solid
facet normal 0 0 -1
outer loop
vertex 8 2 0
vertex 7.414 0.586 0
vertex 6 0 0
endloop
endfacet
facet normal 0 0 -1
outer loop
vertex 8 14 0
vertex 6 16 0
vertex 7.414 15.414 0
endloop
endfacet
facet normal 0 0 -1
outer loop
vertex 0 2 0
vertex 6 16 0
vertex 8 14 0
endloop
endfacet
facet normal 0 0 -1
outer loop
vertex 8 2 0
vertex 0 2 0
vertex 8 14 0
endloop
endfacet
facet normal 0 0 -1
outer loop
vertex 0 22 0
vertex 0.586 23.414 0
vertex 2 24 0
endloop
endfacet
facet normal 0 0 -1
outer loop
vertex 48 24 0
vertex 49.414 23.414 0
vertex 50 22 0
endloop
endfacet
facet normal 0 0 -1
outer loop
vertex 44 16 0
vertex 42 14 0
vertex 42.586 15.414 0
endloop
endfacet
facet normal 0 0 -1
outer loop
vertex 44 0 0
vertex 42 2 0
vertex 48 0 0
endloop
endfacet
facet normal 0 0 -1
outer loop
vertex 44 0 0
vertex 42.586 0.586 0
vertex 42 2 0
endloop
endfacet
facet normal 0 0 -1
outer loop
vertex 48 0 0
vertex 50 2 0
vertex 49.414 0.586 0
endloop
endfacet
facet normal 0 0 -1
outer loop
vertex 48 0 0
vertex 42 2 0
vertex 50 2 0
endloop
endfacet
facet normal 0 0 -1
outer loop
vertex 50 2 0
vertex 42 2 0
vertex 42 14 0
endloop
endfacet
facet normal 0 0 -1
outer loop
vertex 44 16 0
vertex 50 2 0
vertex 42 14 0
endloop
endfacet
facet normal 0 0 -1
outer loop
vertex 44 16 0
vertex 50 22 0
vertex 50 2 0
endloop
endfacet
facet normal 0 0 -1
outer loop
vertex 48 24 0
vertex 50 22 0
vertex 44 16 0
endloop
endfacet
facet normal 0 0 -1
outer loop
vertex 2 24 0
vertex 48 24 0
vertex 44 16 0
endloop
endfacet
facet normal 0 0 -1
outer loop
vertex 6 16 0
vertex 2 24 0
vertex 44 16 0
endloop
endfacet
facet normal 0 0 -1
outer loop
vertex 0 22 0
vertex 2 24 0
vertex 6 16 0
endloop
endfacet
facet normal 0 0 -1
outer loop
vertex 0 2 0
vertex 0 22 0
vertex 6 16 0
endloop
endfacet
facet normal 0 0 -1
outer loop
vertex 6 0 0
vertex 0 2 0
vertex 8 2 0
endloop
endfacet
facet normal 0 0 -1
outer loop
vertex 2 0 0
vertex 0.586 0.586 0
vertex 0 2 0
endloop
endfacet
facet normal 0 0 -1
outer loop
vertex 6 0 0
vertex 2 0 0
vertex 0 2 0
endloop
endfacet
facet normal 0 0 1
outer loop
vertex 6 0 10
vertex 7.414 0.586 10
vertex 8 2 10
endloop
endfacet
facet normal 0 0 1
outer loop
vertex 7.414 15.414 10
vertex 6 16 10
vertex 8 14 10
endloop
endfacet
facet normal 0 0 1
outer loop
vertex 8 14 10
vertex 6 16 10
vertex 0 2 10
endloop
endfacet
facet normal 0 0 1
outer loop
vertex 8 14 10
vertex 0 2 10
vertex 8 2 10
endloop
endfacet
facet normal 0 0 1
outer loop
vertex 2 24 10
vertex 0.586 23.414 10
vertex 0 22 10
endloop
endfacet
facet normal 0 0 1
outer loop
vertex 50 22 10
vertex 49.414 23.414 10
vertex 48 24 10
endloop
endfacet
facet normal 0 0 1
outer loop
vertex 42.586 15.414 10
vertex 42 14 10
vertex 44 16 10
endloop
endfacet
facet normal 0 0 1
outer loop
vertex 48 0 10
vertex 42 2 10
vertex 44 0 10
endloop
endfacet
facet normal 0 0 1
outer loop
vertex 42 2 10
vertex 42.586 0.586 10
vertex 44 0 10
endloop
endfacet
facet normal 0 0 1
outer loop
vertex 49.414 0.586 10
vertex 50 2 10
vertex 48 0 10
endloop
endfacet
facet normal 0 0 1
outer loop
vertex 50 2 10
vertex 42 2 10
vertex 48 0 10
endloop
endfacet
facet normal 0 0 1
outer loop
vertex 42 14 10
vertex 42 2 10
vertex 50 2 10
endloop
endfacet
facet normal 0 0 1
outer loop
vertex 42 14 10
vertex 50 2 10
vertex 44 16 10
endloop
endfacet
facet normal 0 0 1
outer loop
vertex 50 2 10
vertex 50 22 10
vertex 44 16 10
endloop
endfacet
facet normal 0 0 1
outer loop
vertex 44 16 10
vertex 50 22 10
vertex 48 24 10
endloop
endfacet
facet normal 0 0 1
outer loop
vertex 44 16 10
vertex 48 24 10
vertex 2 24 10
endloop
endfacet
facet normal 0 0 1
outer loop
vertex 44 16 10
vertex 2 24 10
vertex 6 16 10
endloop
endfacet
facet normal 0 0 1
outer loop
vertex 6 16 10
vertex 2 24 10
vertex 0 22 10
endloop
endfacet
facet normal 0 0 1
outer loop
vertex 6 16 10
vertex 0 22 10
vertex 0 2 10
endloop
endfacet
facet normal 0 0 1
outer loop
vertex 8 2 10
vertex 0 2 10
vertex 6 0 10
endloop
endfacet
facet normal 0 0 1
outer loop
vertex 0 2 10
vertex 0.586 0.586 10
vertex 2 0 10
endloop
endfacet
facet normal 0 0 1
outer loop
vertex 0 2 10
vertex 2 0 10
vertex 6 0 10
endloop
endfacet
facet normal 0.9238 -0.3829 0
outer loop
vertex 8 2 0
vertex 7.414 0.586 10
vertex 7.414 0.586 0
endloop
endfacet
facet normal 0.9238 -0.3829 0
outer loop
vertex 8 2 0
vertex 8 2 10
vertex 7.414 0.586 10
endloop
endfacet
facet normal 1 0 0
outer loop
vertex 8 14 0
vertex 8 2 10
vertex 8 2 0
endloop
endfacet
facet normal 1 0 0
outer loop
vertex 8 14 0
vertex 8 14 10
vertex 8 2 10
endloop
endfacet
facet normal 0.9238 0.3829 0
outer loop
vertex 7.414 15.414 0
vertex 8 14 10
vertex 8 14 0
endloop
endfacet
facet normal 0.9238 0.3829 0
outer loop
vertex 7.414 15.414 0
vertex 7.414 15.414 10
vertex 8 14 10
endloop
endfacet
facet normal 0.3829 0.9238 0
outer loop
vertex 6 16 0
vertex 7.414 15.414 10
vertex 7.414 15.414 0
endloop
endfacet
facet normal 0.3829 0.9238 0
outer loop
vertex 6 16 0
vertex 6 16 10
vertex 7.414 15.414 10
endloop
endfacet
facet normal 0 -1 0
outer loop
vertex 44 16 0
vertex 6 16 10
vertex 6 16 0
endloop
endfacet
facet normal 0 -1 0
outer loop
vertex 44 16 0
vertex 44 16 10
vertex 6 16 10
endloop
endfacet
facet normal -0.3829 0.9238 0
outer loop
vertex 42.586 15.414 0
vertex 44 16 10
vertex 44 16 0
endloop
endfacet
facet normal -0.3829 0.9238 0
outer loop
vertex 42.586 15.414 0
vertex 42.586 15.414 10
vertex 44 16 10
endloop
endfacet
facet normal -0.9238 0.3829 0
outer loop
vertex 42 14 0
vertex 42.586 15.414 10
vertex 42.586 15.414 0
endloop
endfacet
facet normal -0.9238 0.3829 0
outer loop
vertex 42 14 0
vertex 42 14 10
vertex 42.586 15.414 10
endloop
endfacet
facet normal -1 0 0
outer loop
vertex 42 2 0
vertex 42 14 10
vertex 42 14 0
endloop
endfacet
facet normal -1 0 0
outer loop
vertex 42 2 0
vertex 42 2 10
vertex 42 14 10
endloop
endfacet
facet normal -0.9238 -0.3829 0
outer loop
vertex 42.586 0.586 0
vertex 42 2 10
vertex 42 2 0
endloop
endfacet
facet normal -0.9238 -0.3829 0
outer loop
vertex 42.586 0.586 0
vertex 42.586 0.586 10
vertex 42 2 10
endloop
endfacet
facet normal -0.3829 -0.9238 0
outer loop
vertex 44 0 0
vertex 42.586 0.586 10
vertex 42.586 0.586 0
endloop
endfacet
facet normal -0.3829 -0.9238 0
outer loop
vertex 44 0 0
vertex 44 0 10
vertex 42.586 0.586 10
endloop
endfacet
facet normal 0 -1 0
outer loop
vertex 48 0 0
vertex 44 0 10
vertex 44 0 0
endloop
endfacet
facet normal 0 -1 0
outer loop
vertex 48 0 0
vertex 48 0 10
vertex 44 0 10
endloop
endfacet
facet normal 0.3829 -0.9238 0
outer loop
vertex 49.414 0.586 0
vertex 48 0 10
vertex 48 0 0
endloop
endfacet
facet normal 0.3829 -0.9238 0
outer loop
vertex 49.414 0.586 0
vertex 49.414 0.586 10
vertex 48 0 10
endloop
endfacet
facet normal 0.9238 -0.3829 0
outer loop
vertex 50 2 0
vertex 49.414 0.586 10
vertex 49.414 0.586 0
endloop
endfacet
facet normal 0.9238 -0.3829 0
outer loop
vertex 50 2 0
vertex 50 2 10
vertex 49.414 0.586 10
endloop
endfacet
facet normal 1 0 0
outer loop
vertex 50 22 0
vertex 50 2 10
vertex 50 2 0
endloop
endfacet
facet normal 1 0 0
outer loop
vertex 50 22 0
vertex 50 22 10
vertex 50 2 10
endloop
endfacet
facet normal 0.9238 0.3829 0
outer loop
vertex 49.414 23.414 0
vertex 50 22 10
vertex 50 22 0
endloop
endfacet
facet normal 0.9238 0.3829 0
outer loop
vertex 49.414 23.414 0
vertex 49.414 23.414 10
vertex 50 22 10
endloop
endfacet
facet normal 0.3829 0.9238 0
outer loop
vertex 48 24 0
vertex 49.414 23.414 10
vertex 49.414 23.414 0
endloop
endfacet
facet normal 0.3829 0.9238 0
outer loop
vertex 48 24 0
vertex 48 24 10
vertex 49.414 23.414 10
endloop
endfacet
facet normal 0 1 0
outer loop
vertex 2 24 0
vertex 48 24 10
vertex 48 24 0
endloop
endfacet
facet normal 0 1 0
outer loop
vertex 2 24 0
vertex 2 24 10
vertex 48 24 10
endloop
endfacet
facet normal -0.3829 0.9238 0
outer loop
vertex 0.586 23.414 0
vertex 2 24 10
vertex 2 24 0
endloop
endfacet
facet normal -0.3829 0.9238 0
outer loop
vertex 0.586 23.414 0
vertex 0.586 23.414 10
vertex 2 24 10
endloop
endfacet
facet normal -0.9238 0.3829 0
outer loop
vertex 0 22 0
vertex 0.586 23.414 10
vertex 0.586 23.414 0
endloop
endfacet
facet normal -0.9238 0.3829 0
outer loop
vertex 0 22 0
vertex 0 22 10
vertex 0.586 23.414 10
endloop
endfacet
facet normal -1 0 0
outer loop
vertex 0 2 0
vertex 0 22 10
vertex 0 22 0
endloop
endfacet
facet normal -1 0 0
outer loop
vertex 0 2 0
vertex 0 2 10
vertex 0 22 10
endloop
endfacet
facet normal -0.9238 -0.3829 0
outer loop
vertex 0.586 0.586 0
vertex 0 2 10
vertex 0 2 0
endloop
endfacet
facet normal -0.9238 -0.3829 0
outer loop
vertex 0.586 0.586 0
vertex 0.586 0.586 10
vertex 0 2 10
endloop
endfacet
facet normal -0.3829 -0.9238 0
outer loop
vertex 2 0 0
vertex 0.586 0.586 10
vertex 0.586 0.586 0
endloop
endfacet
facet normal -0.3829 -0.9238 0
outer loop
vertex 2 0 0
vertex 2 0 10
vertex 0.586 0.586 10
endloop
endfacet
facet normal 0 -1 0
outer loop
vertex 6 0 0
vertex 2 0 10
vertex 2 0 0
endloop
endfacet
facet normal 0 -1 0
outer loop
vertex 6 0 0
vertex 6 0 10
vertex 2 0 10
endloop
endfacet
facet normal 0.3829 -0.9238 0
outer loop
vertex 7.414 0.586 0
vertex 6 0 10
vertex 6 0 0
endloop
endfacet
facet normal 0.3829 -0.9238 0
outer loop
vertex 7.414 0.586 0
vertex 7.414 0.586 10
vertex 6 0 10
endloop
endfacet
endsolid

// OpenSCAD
$fn = 32;

// ----------------------------------------------------------------------
// Clip blank: staple clip, 10 mm thick
// ----------------------------------------------------------------------

// --- parameters (mm) ---
profile_height = 10;      // extrusion height
profile_points = 24;      // points of the closed outline

profile = [[0, 2], [0.586, 0.586], [2, 0], [6, 0], [7.414, 0.586], [8, 2], [8, 14], [7.414, 15.414], [6, 16], [44, 16], [42.586, 15.414], [42, 14], [42, 2], [42.586, 0.586], [44, 0], [48, 0], [49.414, 0.586], [50, 2], [50, 22], [49.414, 23.414], [48, 24], [2, 24], [0.586, 23.414], [0, 22]];  // single closed polygon, 24 points, counter clockwise

// --- the one profile operation ---
linear_extrude(height = profile_height) polygon(points = profile);
